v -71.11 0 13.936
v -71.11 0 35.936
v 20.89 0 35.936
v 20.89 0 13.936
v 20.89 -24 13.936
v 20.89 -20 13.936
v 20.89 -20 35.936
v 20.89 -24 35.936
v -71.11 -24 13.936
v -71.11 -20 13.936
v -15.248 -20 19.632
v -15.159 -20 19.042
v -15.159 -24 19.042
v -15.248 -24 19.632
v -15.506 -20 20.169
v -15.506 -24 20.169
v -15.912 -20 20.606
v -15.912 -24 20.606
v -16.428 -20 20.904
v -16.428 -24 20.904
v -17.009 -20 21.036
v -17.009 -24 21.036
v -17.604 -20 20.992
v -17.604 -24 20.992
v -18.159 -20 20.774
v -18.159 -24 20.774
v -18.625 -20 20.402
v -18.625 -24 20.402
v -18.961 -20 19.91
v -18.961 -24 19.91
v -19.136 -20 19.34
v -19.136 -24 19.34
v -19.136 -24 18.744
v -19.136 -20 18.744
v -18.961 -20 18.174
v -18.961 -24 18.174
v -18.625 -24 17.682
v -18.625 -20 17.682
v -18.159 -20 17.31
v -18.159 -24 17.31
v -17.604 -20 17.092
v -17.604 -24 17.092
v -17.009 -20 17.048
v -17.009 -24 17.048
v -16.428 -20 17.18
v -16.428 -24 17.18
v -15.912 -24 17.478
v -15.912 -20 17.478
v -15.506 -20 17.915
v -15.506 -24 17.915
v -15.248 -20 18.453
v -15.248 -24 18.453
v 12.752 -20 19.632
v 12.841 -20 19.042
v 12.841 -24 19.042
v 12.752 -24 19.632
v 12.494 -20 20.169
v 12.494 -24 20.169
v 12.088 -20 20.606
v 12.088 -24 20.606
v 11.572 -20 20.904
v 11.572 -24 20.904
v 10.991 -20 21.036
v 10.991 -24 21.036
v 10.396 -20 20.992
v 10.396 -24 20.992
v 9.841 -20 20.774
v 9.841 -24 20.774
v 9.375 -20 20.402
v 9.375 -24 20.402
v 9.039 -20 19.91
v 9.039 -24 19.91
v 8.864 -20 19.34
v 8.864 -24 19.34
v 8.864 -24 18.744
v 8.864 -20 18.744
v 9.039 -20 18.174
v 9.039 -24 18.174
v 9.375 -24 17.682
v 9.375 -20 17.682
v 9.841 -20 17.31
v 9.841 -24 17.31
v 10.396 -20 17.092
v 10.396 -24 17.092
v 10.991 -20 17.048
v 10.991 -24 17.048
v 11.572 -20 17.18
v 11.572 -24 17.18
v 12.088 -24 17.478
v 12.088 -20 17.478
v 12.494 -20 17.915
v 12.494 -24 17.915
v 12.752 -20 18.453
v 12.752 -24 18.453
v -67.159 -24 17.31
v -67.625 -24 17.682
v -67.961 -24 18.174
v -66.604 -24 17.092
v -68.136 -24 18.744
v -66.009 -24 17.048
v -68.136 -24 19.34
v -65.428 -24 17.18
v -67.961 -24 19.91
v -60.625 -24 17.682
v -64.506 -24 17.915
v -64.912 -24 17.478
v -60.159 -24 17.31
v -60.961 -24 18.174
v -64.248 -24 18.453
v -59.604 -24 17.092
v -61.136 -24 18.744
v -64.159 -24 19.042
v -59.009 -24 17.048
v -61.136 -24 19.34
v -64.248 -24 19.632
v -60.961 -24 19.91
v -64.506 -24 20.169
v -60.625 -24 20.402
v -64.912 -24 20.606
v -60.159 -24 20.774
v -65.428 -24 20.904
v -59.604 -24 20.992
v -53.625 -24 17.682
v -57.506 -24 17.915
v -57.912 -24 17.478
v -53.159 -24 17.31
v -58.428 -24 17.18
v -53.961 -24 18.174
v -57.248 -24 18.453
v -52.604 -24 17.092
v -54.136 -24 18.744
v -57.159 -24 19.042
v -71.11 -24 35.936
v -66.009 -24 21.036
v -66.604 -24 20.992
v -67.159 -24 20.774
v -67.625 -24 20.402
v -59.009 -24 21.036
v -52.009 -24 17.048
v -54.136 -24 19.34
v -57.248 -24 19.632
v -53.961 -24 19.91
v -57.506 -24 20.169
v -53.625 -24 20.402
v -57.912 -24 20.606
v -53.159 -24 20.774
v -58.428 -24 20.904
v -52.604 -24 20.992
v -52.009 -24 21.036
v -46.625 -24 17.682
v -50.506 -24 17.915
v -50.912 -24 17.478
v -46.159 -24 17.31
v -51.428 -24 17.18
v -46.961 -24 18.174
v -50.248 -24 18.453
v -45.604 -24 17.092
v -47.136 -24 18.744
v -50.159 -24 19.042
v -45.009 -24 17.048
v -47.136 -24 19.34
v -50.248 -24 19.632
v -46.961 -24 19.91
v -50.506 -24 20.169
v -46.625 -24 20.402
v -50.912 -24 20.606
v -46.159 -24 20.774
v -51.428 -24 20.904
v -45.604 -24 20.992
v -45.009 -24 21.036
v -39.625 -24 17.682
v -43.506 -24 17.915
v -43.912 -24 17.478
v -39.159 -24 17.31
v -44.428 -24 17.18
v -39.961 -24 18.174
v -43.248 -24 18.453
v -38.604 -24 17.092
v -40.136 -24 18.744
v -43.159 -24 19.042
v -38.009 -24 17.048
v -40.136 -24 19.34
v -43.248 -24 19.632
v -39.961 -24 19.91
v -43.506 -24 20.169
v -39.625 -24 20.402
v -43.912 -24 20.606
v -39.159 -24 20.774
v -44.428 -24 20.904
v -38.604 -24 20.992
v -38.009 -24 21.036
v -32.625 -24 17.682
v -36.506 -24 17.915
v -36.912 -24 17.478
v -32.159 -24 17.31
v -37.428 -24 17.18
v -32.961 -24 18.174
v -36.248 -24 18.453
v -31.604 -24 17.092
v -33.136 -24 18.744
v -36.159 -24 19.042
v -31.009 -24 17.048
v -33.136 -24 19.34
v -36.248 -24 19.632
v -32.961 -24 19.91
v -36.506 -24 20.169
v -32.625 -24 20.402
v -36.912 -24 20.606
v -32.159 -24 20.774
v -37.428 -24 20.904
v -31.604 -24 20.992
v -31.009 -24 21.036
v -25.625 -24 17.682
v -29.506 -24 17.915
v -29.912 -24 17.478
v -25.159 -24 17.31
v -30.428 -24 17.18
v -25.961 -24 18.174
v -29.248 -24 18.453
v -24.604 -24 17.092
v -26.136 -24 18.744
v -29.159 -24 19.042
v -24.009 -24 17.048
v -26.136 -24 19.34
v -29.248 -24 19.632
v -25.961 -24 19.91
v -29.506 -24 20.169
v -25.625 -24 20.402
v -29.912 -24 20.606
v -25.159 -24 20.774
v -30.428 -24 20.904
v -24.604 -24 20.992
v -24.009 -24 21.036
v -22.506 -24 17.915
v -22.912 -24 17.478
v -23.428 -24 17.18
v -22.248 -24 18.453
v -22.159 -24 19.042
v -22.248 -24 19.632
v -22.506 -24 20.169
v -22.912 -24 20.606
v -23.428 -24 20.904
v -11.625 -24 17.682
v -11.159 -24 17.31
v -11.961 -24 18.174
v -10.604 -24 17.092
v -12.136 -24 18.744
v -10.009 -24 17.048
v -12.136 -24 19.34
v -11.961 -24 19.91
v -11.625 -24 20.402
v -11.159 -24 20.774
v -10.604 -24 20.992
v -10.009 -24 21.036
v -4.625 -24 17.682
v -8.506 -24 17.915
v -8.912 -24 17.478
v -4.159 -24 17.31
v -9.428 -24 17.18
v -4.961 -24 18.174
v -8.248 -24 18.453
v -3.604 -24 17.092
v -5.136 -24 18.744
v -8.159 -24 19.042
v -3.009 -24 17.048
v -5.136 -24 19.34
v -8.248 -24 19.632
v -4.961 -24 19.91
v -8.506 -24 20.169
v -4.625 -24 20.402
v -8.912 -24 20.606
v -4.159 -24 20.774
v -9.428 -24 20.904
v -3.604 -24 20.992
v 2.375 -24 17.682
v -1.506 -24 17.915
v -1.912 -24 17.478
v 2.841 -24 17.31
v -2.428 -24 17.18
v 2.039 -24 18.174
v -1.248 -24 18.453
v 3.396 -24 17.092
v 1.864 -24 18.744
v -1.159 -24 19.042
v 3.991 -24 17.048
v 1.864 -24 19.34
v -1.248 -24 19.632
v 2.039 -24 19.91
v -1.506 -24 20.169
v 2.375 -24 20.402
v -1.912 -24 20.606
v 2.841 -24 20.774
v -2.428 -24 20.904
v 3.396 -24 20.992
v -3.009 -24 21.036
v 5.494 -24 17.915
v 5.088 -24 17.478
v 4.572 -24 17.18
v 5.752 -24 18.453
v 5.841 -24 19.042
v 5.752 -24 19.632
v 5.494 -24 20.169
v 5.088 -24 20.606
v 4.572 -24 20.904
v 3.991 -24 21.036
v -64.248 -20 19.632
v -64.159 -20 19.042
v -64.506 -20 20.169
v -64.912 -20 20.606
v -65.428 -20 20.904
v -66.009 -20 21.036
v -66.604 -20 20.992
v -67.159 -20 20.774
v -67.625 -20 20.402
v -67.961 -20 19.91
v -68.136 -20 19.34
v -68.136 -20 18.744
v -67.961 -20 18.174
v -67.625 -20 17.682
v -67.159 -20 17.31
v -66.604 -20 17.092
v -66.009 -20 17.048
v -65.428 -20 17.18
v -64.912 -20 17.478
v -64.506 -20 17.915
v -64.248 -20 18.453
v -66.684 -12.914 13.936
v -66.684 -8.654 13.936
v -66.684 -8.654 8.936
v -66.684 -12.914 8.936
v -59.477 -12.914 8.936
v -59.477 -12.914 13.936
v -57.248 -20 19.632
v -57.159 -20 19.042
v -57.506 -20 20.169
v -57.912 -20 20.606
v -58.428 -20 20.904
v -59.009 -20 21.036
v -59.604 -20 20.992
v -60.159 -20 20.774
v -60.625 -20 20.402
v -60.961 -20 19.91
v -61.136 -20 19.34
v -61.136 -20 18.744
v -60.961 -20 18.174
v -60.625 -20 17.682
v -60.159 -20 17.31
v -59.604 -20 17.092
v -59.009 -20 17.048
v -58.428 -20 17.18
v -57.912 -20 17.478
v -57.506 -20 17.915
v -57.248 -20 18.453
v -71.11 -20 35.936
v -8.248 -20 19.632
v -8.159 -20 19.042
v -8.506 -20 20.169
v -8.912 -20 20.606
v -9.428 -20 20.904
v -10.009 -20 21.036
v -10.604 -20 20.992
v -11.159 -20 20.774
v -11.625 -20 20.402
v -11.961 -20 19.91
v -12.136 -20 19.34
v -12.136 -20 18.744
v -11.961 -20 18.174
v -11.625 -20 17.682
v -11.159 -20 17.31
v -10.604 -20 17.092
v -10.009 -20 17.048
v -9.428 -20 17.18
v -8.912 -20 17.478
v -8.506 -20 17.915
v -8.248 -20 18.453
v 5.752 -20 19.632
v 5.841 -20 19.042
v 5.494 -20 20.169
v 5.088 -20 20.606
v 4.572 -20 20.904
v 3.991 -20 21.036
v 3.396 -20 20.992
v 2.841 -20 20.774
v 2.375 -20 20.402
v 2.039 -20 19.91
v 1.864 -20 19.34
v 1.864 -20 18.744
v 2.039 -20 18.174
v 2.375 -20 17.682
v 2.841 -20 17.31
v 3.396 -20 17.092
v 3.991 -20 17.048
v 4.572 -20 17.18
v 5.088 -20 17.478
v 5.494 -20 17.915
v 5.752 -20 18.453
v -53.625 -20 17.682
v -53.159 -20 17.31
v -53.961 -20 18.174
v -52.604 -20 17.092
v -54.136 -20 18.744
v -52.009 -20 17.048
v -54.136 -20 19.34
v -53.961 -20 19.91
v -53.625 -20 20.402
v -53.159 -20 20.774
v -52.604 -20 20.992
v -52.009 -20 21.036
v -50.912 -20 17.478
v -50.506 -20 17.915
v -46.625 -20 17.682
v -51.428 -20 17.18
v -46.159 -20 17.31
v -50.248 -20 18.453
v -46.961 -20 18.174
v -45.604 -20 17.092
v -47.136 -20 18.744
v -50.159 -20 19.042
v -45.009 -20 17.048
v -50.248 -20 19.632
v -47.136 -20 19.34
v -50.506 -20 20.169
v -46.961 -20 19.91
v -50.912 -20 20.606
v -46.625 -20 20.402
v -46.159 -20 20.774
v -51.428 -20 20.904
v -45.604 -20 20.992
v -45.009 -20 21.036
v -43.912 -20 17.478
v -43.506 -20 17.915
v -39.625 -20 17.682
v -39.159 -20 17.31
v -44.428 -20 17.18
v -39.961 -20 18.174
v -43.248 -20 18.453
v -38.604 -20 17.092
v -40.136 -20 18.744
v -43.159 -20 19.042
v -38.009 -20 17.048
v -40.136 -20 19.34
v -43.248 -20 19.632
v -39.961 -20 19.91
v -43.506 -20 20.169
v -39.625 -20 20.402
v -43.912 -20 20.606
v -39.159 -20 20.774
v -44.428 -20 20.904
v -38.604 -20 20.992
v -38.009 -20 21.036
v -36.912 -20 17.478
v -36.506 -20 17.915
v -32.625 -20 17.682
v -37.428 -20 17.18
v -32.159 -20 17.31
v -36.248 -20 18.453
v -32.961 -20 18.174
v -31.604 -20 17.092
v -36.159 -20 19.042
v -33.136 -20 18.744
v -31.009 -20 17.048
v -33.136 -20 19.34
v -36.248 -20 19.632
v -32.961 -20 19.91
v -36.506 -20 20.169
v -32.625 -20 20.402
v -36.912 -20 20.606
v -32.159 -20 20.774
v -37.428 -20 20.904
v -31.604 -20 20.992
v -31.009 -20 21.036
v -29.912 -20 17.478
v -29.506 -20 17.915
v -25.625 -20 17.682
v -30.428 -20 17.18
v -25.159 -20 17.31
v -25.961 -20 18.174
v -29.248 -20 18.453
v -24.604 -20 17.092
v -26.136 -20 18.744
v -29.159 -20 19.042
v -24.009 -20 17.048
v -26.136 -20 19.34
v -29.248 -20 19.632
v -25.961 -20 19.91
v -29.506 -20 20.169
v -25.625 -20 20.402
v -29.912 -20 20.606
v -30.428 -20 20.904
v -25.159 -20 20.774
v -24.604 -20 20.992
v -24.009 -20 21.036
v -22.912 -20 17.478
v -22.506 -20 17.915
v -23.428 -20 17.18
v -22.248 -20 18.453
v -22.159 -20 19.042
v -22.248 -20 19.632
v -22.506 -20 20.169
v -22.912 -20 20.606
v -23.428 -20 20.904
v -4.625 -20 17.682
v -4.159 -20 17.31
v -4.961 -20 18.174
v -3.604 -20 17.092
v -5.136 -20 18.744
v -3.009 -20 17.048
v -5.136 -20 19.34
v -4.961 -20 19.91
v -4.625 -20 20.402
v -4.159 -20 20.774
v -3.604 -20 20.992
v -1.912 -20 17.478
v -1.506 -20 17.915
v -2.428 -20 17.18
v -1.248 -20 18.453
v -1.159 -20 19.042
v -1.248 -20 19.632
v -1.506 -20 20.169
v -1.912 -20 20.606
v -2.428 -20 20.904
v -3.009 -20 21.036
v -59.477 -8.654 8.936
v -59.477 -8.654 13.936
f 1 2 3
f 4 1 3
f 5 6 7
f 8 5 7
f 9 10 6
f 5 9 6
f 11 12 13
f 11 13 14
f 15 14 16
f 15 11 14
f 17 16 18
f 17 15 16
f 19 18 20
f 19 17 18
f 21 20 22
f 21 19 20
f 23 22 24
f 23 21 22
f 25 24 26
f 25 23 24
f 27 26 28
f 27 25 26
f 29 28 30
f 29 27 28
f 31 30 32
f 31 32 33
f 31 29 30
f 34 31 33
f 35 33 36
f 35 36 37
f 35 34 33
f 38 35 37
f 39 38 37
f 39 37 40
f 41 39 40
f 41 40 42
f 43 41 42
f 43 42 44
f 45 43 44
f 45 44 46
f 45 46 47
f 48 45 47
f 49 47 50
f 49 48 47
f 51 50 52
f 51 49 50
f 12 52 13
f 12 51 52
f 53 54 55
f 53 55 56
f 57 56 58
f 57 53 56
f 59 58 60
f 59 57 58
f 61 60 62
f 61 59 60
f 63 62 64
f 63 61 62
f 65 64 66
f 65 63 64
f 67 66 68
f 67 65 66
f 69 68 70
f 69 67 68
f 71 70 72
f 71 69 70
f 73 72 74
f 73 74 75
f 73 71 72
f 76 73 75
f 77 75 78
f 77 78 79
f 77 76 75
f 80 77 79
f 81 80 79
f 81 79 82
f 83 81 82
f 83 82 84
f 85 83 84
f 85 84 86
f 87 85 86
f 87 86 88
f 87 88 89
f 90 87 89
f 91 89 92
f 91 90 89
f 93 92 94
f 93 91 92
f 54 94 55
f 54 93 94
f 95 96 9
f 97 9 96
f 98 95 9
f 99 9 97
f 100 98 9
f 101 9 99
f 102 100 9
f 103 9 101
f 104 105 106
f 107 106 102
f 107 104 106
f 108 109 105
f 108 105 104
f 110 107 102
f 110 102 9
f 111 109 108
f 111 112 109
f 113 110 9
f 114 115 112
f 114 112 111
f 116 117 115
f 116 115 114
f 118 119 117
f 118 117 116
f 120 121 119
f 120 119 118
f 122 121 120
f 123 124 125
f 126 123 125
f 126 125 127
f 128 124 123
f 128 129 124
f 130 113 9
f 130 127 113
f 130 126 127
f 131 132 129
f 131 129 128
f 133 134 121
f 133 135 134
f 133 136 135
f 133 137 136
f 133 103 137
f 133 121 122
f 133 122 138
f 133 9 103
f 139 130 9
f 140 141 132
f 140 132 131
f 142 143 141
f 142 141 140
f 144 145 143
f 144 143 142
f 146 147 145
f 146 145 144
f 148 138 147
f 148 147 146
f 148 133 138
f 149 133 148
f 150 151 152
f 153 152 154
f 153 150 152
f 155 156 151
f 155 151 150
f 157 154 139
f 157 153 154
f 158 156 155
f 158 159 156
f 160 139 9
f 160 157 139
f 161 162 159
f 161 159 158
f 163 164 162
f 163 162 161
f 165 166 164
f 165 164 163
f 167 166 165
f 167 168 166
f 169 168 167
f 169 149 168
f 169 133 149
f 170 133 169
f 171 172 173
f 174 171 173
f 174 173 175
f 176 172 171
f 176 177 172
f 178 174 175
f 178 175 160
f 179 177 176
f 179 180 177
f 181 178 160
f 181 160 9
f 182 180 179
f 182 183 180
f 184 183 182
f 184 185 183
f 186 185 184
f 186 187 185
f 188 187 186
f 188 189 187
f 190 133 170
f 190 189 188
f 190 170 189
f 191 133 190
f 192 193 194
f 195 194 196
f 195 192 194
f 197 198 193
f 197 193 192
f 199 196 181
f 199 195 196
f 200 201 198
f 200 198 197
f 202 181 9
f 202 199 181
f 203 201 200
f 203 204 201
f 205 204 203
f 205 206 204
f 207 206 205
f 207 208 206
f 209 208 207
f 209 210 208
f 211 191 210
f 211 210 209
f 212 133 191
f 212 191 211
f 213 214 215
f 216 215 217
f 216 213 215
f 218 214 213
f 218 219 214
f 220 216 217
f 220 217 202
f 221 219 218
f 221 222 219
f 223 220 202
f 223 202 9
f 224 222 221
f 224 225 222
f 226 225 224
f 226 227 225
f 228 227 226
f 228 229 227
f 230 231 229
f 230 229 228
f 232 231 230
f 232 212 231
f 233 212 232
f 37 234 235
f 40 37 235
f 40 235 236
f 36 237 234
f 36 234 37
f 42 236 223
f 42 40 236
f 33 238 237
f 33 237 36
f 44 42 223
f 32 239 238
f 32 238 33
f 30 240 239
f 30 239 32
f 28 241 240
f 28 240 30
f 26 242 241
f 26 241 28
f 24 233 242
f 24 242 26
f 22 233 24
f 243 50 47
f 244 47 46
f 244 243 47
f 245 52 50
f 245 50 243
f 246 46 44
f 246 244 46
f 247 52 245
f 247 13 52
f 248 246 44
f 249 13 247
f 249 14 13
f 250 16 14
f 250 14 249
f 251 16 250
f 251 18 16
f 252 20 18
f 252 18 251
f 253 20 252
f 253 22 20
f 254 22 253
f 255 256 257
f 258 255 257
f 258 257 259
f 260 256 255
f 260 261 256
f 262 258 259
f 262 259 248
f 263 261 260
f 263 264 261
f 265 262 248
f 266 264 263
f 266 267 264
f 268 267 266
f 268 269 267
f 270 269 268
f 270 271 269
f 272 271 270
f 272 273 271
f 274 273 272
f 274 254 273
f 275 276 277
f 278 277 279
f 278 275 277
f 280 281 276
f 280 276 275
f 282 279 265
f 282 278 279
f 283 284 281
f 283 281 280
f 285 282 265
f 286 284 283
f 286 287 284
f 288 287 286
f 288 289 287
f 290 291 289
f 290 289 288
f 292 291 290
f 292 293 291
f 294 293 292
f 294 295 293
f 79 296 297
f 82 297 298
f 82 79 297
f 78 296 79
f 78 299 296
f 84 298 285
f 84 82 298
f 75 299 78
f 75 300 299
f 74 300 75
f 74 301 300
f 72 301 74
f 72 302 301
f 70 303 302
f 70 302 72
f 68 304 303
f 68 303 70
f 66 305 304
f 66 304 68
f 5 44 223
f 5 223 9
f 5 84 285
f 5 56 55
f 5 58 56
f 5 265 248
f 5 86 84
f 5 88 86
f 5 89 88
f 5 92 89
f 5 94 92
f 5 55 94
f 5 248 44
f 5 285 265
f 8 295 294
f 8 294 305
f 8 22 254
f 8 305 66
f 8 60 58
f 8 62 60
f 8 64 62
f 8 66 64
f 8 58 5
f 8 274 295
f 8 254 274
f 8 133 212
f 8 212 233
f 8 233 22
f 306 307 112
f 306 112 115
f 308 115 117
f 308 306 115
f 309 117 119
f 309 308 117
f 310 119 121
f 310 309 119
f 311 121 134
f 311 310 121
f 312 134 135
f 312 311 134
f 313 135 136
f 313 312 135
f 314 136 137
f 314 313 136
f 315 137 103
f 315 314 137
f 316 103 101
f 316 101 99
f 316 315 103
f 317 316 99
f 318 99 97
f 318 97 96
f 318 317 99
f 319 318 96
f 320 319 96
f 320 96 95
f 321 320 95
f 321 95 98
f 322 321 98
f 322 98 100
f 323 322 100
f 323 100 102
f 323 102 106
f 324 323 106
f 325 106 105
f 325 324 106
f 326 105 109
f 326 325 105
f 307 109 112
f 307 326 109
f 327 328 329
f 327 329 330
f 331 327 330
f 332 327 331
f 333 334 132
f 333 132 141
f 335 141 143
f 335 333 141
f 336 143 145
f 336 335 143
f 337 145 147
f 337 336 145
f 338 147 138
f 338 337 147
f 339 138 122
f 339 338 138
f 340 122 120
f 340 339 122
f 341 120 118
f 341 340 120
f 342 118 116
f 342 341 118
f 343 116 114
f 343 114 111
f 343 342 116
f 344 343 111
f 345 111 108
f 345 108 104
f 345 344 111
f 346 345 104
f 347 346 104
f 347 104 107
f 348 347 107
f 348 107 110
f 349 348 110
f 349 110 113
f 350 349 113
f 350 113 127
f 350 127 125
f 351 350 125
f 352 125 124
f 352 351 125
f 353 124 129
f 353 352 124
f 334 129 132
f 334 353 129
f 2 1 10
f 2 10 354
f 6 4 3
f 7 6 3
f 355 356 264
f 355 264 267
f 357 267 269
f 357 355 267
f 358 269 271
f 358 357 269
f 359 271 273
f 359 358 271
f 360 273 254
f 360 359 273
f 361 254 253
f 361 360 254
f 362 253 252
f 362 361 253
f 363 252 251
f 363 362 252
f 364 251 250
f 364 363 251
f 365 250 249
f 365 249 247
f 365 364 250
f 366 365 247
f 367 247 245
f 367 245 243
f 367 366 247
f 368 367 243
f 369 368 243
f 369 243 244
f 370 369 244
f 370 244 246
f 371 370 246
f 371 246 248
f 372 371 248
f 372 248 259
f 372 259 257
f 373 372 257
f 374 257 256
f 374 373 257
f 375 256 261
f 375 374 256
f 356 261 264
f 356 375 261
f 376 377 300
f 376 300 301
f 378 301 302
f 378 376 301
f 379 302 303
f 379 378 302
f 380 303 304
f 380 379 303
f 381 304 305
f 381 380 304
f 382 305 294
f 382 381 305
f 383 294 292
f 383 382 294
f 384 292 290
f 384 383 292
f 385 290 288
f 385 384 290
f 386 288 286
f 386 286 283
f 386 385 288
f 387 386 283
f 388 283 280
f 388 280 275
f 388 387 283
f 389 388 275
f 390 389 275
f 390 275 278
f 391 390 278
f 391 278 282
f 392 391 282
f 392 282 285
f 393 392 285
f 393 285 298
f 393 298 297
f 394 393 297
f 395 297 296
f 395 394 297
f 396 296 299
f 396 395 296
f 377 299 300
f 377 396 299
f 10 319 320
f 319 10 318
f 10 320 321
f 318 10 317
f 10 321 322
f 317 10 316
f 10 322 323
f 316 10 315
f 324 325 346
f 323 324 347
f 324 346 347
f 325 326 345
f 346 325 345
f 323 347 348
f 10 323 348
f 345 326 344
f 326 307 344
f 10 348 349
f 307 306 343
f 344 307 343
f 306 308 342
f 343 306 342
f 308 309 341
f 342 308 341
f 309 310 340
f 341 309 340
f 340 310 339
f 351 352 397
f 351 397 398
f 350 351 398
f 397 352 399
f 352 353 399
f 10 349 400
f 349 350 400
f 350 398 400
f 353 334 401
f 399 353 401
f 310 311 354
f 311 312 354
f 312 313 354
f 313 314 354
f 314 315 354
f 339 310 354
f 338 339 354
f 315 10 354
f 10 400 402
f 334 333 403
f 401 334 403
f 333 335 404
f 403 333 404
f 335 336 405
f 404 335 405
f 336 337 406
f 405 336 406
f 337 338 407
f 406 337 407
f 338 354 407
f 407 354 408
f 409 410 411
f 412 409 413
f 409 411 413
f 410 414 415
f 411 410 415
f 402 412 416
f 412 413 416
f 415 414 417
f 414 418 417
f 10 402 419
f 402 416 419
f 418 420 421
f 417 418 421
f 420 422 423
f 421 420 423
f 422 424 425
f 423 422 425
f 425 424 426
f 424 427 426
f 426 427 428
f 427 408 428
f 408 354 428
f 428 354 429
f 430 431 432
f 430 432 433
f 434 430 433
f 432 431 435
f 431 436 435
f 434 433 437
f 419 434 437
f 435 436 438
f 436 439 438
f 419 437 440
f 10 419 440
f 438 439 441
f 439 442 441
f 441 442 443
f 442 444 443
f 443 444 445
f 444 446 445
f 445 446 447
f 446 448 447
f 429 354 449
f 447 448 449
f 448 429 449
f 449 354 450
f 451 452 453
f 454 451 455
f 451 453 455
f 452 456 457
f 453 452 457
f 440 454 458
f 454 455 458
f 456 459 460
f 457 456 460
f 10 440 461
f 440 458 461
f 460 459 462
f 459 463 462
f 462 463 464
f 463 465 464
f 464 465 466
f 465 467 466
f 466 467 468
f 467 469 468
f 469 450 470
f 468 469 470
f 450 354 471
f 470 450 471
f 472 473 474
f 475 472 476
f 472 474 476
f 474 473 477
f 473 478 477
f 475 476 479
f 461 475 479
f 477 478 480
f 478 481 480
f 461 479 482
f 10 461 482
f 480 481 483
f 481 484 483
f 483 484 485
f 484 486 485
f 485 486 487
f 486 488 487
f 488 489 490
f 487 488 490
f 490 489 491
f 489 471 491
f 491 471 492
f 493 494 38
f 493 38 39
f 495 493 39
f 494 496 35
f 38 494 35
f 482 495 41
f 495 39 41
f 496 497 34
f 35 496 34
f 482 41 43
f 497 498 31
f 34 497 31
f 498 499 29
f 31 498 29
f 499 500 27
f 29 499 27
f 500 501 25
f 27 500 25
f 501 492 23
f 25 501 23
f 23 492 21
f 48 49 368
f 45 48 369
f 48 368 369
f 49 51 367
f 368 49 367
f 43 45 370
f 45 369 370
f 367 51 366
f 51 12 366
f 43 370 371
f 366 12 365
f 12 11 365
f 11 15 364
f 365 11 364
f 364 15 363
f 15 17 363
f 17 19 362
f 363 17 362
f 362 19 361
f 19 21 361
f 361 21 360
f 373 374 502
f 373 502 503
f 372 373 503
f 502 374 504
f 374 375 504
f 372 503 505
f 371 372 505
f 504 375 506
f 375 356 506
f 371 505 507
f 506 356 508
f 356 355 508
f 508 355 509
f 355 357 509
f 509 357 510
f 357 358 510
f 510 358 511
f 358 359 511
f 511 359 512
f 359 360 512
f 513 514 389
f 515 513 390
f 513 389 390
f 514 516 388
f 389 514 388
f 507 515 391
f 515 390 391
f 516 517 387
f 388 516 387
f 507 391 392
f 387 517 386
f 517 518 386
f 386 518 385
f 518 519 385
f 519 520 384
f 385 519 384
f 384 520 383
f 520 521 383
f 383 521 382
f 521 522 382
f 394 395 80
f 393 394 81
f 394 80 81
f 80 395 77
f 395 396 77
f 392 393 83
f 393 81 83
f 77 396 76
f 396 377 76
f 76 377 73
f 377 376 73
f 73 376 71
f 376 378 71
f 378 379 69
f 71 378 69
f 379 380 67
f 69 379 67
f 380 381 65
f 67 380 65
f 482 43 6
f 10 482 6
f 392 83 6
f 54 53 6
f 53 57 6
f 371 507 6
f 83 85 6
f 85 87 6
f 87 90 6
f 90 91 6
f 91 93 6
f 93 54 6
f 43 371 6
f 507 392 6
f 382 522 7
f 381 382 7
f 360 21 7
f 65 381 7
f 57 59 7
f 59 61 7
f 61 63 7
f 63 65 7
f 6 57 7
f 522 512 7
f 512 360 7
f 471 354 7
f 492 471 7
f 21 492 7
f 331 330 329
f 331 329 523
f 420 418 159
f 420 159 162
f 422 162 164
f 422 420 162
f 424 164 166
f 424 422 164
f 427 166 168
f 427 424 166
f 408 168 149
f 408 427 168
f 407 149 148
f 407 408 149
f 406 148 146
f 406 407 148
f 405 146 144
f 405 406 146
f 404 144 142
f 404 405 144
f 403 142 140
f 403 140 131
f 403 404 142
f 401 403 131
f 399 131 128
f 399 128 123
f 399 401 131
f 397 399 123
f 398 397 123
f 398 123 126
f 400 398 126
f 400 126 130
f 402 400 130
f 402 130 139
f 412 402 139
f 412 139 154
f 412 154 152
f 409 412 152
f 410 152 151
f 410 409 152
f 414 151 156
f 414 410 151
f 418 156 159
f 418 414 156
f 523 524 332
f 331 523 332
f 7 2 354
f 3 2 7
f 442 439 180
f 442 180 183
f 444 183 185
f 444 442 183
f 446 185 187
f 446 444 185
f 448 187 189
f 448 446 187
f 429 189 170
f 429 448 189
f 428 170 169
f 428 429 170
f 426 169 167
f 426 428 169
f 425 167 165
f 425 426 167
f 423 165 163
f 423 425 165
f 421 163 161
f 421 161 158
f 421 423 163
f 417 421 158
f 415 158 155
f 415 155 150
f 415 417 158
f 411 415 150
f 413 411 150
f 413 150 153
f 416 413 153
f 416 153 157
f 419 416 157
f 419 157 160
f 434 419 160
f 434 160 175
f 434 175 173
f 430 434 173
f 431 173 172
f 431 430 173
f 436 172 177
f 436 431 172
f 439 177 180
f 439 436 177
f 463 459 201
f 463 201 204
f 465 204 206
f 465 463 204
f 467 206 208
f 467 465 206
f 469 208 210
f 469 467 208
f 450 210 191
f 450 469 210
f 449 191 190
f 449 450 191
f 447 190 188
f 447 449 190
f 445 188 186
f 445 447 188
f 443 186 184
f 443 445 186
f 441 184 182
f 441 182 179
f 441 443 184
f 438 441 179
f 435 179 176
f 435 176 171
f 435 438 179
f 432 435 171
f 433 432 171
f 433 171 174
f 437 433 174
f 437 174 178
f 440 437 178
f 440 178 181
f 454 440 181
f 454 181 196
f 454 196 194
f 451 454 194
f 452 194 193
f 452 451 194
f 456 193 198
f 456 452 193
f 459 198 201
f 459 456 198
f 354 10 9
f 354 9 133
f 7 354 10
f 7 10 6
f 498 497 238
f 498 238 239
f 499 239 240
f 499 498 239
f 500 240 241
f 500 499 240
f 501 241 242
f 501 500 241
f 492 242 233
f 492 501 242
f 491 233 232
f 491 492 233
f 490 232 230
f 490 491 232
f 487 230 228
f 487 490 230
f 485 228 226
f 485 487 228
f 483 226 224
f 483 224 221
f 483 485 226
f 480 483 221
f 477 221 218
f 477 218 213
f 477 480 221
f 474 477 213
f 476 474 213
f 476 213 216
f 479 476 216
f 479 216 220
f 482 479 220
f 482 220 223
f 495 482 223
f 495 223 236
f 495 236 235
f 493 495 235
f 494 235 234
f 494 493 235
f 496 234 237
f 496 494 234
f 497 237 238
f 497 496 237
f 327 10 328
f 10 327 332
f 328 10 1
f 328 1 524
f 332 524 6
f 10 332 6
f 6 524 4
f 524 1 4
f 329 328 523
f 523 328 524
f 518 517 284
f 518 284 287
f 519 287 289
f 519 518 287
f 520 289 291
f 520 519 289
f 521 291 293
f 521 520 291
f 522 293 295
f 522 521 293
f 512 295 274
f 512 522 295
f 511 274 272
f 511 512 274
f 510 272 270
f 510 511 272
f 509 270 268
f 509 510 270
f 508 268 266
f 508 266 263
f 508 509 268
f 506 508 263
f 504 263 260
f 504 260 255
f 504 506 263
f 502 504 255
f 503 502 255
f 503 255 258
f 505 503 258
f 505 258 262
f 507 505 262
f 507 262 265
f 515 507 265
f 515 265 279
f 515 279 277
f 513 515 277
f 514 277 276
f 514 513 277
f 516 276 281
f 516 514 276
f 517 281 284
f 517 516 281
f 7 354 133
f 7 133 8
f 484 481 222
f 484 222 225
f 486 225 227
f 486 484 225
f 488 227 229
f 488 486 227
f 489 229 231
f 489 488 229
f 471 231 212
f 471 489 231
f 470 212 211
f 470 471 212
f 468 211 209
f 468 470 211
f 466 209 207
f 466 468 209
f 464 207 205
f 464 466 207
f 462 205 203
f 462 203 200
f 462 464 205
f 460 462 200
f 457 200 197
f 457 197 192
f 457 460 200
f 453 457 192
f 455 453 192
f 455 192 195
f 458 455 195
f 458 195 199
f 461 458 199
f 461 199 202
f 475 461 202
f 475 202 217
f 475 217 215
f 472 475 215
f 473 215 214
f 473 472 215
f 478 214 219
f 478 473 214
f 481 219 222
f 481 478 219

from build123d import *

# Parameters (mm, degrees)
F0_W     = 92
F0_H     = 22
F1_DEPTH = 20
F2_W     = 92
F2_H     = 22
F2_R     = 2
F3_DEPTH = 4
F4_W     = 7.207039
F4_H     = 4.259948
F5_DEPTH = 5


with BuildPart() as f1:
    # F0 (on Front) → F1 (new body)
    with BuildSketch(Plane.XZ):
        with Locations((-25.110383, 24.936029)):
            Rectangle(F0_W, F0_H)
    extrude(amount=F1_DEPTH)

    # F4 (on face) → F5 (join)
    with BuildSketch(Plane(origin=(0, 0, 13.936029), x_dir=(1, 0, 0), z_dir=(0, 0, -1))):
        with Locations((-63.08007, 10.784435)):
            Rectangle(F4_W, F4_H)
    extrude(amount=F5_DEPTH)


with BuildPart() as f3:
    # F2 (on face) → F3 (new body)
    with BuildSketch(Plane.XZ.offset(20)):
        with Locations((-25.110383, 24.936029)):
            Rectangle(F2_W, F2_H)
        with Locations((-66.158772, 19.042049)):
            Circle(F2_R, mode=Mode.SUBTRACT)
        with Locations((-59.158772, 19.042049)):
            Circle(F2_R, mode=Mode.SUBTRACT)
        with Locations((-52.158772, 19.042049)):
            Circle(F2_R, mode=Mode.SUBTRACT)
        with Locations((-45.158772, 19.042049)):
            Circle(F2_R, mode=Mode.SUBTRACT)
        with Locations((-38.158772, 19.042049)):
            Circle(F2_R, mode=Mode.SUBTRACT)
        with Locations((-31.158772, 19.042049)):
            Circle(F2_R, mode=Mode.SUBTRACT)
        with Locations((-24.158772, 19.042049)):
            Circle(F2_R, mode=Mode.SUBTRACT)
        with Locations((-17.158772, 19.042049)):
            Circle(F2_R, mode=Mode.SUBTRACT)
        with Locations((-10.158772, 19.042049)):
            Circle(F2_R, mode=Mode.SUBTRACT)
        with Locations((-3.158772, 19.042049)):
            Circle(F2_R, mode=Mode.SUBTRACT)
        with Locations((3.841228, 19.042049)):
            Circle(F2_R, mode=Mode.SUBTRACT)
        with Locations((10.841228, 19.042049)):
            Circle(F2_R, mode=Mode.SUBTRACT)
    extrude(amount=F3_DEPTH)


solid = Compound([f1.part, f3.part])
